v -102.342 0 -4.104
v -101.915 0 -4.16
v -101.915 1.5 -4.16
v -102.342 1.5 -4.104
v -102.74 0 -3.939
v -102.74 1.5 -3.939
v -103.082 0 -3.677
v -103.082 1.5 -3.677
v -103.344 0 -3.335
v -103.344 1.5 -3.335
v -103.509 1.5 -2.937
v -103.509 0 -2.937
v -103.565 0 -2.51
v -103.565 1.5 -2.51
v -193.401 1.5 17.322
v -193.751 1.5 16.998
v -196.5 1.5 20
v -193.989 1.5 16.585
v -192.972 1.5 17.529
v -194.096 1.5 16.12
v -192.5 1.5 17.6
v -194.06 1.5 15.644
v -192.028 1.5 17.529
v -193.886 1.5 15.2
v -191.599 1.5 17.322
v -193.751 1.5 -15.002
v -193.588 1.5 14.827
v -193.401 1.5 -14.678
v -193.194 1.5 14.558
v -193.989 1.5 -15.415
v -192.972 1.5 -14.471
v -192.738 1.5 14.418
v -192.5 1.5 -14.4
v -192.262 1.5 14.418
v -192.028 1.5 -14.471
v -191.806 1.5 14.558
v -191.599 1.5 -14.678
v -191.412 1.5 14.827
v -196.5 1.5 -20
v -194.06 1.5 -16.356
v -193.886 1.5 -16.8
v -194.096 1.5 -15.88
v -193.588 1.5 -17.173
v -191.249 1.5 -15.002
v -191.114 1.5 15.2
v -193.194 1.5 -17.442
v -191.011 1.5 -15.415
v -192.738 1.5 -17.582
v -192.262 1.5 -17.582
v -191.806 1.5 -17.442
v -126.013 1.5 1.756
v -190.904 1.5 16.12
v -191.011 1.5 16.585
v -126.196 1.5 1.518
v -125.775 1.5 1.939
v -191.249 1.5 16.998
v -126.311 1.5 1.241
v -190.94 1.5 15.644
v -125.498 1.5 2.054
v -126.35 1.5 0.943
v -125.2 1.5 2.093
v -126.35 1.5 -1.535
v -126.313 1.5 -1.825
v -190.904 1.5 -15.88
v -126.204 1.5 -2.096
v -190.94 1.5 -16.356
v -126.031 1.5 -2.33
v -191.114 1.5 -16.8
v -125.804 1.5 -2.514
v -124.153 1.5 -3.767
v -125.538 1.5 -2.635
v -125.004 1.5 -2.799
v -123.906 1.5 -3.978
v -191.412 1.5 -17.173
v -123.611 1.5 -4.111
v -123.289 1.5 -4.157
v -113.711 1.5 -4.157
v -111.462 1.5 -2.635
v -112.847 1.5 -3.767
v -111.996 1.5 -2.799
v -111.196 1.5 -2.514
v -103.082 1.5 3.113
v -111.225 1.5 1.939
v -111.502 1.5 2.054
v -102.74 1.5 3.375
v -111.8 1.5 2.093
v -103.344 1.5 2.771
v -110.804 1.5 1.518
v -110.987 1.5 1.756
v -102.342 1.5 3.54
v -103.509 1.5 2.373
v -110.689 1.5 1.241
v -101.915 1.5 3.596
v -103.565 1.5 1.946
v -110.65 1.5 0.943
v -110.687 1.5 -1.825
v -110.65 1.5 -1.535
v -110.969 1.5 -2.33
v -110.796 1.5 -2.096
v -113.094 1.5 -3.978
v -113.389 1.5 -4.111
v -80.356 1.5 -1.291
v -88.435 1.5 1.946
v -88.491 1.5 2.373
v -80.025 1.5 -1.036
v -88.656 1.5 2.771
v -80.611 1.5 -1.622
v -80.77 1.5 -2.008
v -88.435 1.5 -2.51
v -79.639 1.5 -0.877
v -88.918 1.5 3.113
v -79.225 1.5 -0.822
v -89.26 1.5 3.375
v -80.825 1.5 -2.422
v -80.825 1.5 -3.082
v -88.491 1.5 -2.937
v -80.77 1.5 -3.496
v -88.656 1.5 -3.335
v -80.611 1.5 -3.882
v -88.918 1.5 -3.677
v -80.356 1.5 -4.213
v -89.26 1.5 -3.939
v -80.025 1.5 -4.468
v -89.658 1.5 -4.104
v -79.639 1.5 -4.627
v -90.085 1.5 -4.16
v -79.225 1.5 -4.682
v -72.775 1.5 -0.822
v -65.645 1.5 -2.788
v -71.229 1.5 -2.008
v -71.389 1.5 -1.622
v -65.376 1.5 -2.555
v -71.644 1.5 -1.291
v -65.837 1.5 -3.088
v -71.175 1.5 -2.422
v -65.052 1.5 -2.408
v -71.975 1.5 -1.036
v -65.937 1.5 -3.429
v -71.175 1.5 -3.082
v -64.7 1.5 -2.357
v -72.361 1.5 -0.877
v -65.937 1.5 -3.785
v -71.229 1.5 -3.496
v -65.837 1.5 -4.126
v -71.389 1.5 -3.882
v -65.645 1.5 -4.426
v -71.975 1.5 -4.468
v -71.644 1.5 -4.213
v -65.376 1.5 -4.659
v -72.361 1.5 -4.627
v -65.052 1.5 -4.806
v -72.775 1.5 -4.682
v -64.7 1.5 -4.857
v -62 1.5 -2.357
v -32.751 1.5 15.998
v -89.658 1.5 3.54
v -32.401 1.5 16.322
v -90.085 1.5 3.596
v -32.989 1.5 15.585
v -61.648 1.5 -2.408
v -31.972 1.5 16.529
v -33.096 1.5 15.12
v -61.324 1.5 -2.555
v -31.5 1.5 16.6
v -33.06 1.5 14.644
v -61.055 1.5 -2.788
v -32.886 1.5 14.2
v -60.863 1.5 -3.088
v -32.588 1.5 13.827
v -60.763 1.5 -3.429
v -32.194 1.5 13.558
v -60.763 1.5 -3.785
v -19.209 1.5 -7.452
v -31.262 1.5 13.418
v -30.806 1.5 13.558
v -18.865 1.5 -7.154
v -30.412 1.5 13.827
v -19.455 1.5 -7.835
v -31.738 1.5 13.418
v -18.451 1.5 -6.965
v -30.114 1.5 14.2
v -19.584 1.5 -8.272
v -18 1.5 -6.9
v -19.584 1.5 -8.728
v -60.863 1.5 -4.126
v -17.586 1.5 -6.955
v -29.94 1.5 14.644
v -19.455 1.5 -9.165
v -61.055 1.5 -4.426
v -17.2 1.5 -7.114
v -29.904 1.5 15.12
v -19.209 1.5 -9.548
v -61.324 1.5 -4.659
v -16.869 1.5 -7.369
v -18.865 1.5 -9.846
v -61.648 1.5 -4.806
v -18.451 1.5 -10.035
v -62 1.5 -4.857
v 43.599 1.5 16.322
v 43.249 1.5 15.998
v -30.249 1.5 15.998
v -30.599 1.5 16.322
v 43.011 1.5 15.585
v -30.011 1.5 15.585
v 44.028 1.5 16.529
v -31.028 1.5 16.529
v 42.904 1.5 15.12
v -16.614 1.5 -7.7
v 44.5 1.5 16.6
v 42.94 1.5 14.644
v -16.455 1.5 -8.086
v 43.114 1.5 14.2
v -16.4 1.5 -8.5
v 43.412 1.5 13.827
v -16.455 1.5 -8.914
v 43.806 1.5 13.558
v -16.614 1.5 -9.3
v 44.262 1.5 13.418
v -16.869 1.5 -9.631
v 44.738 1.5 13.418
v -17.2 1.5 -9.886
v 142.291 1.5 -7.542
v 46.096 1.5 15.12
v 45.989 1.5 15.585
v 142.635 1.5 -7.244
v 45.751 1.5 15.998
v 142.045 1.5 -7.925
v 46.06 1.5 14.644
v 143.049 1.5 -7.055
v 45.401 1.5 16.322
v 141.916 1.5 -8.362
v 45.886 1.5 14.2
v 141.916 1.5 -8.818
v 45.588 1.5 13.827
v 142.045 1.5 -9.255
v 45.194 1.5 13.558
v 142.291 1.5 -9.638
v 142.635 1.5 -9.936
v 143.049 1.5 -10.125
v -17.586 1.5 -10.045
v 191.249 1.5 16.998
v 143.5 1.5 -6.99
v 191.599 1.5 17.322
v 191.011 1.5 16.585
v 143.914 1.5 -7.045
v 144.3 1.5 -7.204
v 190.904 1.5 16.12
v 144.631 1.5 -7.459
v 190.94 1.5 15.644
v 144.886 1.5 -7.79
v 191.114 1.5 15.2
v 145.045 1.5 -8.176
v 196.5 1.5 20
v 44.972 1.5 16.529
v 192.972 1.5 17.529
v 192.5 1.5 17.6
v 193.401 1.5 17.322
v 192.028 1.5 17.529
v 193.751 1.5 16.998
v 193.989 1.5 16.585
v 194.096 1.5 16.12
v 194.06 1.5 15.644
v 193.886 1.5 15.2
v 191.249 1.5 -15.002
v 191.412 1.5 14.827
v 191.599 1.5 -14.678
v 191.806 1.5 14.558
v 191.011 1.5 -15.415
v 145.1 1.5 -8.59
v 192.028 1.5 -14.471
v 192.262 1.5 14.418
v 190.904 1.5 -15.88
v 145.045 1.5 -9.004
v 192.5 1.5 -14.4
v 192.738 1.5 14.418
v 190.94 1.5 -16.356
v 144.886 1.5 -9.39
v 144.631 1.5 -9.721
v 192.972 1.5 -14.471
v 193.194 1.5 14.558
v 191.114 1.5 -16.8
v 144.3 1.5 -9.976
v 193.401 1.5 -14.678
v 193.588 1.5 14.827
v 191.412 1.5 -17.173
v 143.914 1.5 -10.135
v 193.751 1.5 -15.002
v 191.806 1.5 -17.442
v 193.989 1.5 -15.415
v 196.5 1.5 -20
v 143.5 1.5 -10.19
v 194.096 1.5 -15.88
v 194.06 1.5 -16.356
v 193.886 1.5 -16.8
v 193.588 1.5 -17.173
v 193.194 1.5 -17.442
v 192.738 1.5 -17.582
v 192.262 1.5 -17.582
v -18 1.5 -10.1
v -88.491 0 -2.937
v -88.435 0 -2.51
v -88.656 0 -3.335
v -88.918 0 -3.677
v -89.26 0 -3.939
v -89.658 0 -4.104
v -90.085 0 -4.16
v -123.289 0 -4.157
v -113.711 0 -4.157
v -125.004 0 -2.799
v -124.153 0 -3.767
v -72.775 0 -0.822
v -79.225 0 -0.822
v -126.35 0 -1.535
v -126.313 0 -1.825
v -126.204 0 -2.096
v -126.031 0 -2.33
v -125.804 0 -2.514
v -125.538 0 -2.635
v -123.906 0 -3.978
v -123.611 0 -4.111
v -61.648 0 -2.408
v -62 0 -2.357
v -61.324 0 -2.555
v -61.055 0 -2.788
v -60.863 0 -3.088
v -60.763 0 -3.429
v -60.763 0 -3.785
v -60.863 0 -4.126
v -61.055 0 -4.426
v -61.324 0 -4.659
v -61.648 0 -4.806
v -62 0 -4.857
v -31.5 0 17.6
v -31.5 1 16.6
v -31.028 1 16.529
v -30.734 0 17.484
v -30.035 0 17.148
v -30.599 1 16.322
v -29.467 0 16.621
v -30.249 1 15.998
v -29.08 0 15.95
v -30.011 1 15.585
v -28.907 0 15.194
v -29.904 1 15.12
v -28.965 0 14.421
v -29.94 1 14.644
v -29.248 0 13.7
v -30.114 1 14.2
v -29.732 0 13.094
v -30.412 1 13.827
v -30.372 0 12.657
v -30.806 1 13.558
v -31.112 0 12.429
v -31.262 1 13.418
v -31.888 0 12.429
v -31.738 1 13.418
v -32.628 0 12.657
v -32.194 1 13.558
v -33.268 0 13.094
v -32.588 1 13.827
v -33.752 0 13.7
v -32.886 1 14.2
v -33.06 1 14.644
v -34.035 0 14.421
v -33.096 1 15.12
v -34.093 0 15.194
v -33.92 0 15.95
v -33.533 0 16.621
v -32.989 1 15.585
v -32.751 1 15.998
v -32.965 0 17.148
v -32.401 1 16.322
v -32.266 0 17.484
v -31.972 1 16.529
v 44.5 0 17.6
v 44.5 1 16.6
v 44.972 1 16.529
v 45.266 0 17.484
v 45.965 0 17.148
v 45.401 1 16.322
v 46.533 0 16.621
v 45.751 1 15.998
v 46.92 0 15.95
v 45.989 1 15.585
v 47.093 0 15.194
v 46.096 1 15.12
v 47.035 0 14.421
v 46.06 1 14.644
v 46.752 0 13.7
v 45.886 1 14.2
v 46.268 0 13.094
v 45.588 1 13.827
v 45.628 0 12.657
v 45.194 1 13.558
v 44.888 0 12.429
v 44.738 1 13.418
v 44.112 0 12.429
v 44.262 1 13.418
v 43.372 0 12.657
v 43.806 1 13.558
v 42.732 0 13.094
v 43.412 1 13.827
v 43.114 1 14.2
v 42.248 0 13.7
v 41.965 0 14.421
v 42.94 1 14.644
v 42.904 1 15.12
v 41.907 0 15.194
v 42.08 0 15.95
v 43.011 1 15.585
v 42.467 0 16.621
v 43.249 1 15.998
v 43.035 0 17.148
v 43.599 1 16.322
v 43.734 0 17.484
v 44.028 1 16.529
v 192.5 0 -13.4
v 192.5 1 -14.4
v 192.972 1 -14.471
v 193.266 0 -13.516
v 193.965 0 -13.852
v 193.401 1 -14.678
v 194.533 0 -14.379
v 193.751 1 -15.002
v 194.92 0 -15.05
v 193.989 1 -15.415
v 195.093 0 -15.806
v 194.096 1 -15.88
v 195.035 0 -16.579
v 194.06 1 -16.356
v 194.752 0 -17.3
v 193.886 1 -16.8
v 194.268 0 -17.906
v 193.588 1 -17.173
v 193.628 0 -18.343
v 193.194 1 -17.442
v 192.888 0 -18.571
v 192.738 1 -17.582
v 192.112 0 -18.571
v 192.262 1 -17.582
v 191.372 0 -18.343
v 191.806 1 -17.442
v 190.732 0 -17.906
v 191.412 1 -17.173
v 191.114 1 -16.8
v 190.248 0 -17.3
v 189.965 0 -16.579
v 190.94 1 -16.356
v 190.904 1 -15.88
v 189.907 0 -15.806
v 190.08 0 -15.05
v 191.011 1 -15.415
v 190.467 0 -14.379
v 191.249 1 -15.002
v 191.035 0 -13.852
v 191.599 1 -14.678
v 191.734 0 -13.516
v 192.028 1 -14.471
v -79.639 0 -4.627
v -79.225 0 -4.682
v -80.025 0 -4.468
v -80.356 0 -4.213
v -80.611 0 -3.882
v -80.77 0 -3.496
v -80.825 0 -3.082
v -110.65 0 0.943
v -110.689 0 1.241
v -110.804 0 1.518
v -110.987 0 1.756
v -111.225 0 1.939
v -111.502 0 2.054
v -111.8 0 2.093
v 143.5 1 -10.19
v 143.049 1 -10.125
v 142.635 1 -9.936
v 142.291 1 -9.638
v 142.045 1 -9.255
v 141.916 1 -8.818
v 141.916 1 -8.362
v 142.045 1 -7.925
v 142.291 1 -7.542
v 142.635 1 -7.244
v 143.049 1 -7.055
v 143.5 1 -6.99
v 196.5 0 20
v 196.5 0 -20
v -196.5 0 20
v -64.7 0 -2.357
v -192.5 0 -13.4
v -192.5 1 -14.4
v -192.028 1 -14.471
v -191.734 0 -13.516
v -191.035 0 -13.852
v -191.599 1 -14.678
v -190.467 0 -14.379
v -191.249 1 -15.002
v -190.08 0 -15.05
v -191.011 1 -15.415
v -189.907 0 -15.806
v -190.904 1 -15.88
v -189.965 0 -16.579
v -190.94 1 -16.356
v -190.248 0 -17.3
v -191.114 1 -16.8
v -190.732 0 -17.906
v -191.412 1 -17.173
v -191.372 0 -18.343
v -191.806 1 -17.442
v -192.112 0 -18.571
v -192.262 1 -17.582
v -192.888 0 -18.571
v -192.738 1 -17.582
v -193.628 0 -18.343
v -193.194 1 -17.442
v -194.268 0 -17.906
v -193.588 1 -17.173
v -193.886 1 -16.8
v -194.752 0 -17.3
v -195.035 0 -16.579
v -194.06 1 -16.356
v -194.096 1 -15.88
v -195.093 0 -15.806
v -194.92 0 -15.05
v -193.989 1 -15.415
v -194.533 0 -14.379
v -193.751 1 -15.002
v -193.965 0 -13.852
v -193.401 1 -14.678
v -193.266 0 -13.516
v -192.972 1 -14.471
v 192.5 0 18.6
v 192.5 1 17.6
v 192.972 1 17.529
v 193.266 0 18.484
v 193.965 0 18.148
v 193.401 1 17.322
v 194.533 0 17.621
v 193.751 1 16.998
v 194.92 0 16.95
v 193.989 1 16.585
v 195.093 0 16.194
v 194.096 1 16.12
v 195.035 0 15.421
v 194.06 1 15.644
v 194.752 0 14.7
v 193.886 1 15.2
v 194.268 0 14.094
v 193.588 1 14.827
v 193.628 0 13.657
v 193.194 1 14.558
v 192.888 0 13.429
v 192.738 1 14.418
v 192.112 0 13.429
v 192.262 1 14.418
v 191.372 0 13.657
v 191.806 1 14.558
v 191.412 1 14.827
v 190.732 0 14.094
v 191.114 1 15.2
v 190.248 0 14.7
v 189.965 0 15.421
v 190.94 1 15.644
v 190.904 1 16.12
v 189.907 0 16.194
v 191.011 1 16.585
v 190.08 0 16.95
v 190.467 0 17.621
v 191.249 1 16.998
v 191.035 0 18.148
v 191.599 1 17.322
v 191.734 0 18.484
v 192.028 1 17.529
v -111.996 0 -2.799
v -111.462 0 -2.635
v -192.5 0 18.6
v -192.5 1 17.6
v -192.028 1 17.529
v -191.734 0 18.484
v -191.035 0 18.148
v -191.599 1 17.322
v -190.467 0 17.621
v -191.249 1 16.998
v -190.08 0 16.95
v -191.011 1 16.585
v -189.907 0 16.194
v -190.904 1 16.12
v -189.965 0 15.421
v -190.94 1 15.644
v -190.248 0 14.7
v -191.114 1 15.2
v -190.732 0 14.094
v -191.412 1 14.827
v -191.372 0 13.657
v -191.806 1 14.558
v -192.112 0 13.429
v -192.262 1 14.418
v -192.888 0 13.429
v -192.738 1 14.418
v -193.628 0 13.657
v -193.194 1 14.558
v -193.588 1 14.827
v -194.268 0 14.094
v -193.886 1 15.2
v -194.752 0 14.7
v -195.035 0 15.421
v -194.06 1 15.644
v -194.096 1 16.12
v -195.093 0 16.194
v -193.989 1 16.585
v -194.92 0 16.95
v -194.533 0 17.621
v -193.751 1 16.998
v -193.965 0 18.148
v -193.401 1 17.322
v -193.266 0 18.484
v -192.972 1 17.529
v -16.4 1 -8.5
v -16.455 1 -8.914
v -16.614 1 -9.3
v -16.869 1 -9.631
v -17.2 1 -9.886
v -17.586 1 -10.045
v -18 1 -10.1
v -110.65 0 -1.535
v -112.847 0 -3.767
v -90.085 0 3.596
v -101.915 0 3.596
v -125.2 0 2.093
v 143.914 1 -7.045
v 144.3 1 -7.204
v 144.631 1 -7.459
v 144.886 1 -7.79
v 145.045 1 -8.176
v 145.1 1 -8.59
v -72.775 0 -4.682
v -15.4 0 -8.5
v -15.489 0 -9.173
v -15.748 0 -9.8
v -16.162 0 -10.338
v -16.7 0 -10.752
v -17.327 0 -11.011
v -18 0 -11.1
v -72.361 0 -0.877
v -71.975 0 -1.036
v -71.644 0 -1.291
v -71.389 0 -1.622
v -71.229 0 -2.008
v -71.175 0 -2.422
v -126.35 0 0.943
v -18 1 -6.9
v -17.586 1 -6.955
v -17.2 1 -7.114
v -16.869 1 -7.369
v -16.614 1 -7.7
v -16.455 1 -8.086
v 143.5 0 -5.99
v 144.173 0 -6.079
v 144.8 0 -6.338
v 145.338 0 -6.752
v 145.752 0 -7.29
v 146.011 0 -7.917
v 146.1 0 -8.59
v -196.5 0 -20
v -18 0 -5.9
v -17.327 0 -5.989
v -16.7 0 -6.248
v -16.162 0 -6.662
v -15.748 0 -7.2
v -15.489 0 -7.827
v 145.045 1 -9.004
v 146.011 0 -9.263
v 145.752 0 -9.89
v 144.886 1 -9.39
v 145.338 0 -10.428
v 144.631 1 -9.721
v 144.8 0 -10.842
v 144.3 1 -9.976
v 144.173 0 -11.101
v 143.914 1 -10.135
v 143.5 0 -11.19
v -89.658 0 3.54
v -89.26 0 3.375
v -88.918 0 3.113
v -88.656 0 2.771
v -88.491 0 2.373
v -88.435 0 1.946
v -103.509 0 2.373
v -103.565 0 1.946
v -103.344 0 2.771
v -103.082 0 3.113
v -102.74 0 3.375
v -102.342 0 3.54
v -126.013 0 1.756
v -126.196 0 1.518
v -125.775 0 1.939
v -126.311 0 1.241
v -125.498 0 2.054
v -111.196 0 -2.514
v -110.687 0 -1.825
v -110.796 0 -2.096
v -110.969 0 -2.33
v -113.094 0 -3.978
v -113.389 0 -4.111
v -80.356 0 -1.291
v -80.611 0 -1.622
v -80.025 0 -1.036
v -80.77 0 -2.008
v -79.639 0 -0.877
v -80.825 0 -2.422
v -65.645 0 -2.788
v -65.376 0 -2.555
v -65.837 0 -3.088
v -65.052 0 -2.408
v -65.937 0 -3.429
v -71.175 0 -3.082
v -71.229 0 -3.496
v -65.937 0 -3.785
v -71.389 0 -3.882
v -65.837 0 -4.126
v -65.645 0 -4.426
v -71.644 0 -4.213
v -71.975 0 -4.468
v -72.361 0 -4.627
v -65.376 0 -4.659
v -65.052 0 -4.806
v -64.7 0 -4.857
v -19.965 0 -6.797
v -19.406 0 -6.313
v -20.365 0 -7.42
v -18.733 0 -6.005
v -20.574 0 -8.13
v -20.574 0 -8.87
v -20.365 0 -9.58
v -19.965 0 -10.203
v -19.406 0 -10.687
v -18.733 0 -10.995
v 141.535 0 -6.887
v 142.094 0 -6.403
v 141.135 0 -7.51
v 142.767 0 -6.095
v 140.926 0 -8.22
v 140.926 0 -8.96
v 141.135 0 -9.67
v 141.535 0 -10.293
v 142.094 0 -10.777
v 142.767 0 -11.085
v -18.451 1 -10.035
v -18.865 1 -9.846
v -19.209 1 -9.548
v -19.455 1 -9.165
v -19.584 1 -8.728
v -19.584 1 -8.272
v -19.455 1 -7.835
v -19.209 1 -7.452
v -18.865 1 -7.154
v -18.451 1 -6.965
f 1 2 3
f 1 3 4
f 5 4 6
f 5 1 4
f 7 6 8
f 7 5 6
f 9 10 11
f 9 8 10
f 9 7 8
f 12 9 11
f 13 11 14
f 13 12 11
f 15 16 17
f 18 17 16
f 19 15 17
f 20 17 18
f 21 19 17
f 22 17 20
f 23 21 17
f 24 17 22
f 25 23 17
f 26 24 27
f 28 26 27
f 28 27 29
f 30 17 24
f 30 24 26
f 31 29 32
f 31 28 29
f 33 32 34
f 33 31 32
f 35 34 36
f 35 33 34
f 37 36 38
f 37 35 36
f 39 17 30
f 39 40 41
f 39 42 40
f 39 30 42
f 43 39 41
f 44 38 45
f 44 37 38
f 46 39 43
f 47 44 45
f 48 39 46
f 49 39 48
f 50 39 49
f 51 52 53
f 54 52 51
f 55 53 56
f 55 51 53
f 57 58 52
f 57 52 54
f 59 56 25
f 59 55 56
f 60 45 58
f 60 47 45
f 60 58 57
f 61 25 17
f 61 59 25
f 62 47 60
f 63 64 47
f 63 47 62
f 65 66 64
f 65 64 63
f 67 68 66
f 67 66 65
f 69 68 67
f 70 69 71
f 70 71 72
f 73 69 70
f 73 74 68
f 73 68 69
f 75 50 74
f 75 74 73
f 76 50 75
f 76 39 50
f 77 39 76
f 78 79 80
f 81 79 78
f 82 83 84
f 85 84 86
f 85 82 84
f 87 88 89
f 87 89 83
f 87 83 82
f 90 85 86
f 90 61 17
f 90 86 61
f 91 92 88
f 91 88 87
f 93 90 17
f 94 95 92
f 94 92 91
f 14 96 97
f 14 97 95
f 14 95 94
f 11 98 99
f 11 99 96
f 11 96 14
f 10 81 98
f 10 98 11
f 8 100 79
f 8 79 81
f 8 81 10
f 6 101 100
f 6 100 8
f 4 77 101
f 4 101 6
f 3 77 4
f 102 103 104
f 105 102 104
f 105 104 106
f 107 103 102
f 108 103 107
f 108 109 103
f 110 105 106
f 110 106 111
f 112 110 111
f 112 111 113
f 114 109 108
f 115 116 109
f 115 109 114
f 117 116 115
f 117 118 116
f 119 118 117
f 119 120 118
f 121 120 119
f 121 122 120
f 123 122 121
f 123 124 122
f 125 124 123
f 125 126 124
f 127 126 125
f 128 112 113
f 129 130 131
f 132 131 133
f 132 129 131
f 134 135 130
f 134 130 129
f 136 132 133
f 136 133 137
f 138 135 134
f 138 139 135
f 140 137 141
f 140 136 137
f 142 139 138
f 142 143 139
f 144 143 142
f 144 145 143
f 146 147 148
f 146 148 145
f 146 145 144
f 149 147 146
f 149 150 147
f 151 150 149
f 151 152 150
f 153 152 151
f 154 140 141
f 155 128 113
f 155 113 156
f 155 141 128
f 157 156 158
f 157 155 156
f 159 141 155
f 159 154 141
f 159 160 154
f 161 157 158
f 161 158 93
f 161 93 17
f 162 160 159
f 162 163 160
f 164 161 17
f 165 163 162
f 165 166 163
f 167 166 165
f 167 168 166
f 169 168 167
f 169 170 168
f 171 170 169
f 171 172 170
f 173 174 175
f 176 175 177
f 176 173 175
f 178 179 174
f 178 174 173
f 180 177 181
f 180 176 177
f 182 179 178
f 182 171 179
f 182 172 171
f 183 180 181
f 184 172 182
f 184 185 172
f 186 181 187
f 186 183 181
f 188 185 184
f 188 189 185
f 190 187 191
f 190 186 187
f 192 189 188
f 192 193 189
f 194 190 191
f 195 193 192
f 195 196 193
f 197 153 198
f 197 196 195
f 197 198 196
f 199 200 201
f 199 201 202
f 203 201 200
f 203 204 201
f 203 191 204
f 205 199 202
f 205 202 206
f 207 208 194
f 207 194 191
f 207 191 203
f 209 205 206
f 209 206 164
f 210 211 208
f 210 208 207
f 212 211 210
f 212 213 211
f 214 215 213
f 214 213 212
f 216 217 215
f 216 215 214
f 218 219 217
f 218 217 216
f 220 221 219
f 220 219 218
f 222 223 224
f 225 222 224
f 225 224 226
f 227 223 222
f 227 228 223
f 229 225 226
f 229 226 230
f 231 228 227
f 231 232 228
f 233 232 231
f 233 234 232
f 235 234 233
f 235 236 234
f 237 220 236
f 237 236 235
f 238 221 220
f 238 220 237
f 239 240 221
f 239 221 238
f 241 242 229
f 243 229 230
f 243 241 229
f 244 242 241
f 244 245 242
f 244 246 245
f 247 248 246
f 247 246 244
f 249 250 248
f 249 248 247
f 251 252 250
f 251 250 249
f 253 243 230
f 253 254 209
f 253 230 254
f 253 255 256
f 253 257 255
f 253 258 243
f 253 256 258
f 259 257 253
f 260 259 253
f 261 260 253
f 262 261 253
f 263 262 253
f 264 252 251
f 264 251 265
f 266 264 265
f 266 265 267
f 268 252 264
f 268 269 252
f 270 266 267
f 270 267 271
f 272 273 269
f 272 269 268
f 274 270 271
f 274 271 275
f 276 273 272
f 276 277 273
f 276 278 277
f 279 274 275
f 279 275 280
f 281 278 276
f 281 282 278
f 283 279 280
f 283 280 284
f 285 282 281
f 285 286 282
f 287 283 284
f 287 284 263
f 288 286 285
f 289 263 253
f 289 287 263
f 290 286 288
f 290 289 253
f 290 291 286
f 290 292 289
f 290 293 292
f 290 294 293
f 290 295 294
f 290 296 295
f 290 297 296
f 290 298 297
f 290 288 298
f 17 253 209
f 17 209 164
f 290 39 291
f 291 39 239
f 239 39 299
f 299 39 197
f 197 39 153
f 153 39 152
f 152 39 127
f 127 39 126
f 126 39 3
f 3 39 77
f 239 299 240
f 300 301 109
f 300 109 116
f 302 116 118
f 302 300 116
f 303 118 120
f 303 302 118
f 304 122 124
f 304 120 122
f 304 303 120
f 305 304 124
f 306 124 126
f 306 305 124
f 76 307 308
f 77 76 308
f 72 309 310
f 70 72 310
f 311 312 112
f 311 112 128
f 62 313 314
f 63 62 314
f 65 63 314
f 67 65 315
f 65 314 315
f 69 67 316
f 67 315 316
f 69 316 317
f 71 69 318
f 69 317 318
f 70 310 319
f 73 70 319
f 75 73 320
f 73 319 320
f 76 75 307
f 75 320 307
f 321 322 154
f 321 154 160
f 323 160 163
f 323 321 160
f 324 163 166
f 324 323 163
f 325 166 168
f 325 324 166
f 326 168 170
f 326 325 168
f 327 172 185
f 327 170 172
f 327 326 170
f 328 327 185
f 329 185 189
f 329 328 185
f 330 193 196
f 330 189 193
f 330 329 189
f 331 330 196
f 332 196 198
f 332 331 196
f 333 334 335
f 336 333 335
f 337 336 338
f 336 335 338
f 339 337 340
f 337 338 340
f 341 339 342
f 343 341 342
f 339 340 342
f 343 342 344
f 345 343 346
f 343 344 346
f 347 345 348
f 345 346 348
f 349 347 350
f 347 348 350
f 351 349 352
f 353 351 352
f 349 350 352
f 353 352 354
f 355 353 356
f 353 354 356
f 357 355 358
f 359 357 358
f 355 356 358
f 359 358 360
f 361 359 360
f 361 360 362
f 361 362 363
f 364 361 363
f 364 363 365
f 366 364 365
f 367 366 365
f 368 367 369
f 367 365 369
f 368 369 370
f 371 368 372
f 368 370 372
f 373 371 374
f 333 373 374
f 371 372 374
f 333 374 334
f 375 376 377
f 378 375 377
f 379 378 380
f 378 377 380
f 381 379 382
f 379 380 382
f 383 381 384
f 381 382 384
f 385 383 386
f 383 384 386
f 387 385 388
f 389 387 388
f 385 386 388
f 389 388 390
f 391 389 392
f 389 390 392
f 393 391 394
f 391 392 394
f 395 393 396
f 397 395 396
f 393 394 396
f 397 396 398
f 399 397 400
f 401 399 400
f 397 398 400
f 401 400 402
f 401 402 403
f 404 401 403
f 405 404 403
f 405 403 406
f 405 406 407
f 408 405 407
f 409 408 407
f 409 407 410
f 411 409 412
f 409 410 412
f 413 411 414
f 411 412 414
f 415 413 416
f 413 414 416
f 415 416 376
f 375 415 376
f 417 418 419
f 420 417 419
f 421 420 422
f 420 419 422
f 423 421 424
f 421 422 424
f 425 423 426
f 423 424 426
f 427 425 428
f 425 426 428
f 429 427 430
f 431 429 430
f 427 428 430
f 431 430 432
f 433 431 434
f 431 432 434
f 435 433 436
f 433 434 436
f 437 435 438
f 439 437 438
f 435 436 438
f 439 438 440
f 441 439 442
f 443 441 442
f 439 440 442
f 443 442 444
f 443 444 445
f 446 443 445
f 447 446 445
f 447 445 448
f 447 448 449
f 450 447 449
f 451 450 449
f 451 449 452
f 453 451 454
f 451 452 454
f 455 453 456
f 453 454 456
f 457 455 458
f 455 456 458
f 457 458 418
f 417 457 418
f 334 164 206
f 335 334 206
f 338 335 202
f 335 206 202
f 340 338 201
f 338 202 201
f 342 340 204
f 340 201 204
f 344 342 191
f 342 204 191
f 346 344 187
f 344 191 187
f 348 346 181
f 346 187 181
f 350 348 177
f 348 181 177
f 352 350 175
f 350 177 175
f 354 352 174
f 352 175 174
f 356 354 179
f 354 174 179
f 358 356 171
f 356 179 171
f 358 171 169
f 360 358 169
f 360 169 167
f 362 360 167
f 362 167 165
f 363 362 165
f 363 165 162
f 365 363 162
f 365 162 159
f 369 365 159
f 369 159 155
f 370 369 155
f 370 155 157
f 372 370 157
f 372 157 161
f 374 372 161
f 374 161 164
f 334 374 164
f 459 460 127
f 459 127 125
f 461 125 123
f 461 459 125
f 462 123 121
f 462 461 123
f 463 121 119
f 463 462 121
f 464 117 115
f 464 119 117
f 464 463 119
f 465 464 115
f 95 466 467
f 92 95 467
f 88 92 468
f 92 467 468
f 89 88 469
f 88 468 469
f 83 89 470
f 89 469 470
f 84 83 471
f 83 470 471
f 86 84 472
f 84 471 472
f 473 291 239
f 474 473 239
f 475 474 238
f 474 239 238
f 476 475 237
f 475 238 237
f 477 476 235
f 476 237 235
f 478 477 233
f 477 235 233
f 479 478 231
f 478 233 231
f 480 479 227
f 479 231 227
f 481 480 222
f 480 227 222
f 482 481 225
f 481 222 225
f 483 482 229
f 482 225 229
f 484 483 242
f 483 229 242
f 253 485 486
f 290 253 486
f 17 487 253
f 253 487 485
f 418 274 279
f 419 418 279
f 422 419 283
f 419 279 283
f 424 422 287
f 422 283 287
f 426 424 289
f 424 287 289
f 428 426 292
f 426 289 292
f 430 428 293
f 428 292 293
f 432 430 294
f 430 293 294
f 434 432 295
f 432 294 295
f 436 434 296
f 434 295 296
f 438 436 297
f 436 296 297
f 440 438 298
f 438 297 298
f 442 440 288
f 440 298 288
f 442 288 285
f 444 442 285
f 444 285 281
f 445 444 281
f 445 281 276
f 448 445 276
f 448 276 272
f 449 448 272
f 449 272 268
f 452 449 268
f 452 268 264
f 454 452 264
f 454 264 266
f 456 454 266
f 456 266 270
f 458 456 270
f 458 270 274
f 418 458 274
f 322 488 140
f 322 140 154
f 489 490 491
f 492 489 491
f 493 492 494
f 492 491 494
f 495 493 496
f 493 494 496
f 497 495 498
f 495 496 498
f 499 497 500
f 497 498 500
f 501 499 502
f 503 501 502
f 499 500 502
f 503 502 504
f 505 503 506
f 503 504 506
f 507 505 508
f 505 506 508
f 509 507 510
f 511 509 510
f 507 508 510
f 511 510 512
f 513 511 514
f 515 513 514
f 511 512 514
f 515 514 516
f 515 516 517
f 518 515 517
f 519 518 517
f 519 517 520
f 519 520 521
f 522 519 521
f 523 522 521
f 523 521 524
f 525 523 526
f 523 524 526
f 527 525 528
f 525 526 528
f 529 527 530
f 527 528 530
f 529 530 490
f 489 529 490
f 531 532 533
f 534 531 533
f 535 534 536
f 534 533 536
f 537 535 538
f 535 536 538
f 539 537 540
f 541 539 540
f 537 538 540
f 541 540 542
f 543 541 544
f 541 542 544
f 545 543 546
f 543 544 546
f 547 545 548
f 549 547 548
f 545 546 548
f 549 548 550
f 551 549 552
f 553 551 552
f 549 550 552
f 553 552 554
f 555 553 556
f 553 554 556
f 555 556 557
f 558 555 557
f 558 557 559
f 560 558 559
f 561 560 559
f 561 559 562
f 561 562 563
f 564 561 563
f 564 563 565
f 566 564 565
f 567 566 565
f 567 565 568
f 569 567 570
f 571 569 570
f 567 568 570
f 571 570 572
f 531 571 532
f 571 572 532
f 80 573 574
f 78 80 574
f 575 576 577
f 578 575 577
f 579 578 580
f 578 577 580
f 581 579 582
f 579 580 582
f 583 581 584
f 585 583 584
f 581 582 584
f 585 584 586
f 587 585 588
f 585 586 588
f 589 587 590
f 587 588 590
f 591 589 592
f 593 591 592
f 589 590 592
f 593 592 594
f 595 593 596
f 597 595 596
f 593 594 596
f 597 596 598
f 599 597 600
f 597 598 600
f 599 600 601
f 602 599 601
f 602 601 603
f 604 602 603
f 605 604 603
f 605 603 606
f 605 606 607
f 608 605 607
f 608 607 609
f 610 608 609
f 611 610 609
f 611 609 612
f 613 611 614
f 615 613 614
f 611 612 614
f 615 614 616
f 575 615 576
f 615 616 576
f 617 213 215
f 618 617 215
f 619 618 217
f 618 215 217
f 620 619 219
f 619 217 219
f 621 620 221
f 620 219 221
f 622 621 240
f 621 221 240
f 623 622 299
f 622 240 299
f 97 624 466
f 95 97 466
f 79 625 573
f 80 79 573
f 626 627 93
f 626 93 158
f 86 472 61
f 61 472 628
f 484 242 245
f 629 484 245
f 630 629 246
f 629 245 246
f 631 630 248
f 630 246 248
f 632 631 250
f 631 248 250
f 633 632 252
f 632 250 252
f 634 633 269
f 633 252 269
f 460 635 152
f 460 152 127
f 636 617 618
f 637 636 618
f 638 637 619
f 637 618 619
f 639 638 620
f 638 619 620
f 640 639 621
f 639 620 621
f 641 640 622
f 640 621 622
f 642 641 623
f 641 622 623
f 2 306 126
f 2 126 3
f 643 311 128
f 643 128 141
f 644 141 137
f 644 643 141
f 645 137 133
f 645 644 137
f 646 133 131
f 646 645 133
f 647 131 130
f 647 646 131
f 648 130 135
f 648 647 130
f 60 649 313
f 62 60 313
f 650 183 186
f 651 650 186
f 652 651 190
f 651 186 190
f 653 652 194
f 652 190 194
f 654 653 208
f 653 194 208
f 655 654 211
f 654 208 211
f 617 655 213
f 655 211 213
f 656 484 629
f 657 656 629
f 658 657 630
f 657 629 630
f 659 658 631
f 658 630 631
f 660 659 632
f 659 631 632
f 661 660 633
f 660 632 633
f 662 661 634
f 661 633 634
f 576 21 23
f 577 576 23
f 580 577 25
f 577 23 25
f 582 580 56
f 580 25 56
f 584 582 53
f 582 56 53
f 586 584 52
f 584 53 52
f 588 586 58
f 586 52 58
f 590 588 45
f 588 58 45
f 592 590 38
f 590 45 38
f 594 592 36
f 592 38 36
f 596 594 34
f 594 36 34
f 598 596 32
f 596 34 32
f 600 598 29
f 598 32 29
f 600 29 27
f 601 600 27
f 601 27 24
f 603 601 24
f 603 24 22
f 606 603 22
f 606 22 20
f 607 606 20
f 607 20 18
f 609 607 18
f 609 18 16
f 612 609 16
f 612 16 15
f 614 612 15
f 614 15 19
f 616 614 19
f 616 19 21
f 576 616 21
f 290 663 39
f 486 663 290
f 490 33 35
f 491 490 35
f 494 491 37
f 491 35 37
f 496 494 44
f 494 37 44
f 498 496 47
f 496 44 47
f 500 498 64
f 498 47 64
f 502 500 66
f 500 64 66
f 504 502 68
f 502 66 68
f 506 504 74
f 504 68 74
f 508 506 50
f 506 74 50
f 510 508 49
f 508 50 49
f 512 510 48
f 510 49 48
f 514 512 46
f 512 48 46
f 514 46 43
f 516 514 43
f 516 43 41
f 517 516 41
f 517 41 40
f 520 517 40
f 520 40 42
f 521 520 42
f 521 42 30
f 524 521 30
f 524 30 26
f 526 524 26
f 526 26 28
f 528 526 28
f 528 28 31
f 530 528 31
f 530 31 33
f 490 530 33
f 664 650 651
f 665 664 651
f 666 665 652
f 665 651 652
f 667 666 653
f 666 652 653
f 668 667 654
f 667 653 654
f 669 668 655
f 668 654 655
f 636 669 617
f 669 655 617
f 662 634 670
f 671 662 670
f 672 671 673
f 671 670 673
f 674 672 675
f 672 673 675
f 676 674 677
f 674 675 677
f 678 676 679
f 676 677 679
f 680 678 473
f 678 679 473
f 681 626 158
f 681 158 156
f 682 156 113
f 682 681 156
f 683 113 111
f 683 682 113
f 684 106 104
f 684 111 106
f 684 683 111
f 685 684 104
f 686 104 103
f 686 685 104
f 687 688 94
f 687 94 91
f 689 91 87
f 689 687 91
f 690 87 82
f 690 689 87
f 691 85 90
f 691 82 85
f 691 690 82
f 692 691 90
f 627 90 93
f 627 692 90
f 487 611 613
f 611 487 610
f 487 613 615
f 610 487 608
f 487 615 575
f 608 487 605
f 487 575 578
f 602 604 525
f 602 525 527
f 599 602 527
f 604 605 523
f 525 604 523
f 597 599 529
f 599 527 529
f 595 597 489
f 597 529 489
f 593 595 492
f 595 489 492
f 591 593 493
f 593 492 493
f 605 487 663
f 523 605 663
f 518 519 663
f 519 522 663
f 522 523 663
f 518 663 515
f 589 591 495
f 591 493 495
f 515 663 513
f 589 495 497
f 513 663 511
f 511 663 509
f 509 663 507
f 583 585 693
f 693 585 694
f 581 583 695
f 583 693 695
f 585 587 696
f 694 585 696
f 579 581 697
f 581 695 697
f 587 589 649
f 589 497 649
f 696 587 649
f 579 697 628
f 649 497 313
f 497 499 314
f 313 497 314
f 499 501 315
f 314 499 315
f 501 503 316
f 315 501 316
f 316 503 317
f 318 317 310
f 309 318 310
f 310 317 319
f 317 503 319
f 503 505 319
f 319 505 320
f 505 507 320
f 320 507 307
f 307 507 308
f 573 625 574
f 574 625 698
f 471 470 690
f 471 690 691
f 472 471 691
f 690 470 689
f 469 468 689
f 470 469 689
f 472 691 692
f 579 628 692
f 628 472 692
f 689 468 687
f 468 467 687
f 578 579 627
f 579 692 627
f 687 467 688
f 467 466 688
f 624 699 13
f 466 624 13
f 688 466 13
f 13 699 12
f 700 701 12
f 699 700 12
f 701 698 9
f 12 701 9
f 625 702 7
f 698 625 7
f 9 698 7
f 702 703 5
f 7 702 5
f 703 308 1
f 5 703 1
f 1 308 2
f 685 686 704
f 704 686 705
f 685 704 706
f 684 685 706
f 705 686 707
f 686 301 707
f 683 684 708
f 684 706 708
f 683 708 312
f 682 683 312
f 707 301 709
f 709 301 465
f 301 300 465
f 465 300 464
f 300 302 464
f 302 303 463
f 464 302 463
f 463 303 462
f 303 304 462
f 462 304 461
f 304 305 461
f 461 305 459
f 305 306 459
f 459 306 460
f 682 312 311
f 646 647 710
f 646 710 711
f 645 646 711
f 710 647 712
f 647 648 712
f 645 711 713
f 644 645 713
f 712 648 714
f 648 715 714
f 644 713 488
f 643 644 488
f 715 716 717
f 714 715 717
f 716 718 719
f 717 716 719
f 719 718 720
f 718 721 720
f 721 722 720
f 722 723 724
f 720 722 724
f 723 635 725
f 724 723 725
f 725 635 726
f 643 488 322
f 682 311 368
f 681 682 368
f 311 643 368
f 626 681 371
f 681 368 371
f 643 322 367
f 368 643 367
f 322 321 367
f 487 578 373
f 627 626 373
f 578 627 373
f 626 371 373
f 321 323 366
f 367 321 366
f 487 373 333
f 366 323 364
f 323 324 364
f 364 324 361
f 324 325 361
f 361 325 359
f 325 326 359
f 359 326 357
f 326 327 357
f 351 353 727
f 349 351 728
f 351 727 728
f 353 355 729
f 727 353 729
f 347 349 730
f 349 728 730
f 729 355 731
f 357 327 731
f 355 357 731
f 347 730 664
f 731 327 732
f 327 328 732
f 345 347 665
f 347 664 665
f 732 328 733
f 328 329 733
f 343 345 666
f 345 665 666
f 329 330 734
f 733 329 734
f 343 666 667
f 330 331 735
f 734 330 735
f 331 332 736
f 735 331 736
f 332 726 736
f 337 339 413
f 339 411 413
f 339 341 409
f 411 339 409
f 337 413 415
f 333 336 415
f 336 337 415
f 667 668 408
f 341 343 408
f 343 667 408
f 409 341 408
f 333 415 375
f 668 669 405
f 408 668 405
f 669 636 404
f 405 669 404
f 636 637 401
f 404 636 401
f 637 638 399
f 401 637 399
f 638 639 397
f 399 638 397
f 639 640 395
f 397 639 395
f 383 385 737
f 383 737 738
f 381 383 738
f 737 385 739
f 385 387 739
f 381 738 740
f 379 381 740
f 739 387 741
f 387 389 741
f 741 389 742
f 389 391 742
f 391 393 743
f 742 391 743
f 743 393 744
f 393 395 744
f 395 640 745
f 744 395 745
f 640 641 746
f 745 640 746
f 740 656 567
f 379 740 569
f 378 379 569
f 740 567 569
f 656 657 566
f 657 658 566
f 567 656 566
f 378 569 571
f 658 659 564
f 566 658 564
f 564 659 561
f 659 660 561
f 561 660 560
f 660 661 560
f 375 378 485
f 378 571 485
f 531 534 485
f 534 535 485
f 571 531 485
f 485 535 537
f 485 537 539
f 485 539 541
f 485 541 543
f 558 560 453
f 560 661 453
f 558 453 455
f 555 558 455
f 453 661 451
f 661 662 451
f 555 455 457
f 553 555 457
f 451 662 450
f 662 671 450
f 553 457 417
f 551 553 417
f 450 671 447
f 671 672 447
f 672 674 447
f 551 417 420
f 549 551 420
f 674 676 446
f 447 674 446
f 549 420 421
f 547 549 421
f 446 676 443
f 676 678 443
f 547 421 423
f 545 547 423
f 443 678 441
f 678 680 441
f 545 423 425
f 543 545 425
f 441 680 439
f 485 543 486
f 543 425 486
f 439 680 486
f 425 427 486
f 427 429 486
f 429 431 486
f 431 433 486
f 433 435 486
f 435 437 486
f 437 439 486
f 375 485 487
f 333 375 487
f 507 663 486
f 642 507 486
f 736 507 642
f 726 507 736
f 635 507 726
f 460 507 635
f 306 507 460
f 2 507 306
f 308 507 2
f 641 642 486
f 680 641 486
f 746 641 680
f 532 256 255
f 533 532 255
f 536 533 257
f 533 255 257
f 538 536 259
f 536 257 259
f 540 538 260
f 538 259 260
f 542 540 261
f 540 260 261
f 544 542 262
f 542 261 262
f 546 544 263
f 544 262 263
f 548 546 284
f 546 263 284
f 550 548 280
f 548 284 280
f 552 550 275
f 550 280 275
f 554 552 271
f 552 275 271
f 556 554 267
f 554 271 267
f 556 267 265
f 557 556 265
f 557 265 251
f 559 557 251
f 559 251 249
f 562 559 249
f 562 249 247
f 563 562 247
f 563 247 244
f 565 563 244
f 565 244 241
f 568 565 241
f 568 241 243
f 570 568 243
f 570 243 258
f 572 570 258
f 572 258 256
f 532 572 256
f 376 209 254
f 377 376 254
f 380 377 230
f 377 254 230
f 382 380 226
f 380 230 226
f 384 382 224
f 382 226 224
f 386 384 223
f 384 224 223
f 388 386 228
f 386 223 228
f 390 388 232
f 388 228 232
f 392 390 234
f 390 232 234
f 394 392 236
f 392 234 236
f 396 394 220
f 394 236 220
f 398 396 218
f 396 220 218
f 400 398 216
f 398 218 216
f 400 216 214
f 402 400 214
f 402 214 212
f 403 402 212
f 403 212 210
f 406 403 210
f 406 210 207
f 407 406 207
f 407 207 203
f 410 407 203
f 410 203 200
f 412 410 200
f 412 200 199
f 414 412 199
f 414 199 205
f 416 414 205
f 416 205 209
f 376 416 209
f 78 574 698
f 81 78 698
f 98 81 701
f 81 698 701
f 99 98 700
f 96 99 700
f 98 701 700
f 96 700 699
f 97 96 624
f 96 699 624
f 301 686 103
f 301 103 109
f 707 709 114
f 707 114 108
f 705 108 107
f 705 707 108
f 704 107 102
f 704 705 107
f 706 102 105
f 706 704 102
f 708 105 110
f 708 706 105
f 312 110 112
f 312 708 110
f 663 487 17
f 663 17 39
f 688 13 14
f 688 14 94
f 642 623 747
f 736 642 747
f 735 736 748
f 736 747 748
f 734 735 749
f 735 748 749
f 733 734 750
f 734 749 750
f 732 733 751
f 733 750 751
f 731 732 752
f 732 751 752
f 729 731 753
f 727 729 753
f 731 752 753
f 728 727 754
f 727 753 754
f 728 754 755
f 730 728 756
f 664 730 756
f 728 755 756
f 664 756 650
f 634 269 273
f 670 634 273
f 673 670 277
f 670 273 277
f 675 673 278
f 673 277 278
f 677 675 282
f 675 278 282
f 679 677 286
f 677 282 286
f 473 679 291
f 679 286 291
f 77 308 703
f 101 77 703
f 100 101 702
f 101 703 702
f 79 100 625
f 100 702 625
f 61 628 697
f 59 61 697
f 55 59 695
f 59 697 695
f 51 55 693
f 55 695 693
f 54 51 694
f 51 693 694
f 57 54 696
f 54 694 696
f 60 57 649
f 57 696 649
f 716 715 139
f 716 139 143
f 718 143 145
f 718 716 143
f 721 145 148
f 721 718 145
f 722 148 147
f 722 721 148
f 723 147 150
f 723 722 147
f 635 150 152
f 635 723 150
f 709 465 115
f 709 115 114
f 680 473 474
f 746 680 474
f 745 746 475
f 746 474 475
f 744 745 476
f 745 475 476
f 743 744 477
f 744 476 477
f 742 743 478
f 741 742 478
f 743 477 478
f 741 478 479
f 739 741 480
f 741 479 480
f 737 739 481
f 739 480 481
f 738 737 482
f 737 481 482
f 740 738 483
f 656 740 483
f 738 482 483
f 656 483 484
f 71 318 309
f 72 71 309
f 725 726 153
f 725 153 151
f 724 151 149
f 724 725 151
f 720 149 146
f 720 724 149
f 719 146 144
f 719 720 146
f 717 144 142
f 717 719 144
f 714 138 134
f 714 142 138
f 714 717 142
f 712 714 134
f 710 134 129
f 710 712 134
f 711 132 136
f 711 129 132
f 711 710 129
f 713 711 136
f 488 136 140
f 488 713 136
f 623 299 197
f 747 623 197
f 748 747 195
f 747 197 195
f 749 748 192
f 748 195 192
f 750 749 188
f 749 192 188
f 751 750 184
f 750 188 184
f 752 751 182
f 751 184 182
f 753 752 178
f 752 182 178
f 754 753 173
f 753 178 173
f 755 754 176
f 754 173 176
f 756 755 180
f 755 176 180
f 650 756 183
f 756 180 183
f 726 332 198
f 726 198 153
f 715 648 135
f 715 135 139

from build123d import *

# Parameters (mm, degrees)
SKIZZE1_W                       = 393
SKIZZE1_H                       = 40
AUFSATZ_LINEAR_AUSTRAGEN1_DEPTH = 1.5
SKIZZE2_R                       = 1.6
SCHNITT_LINEAR_AUSTRAGEN1_DEPTH = 198.520884972
FASE1_SIZE                      = 1
SCHNITT_LINEAR_AUSTRAGEN2_DEPTH = 198.520884972


with BuildPart() as part:
    # Skizze1 → Aufsatz-Linear austragen1 (new body)
    with BuildSketch(Plane(origin=(0, 0, 0), x_dir=(1, 0, 0), z_dir=(0, 1, 0))):
        Rectangle(SKIZZE1_W, SKIZZE1_H)
    extrude(amount=AUFSATZ_LINEAR_AUSTRAGEN1_DEPTH)

    # Skizze2 → Schnitt-Linear austragen1 (cut, through all)
    with BuildSketch(Plane(origin=(0, 1.5, 0), x_dir=(1, 0, 0), z_dir=(0, 1, 0))):
        with Locations(Location((-192.5, 16, 0), (0, 0, 270))):
            Circle(SKIZZE2_R)
        with Locations(Location((-192.5, -16, 0), (0, 0, 270))):
            Circle(SKIZZE2_R)
        with Locations(Location((192.5, -16, 0), (0, 0, 270))):
            Circle(SKIZZE2_R)
        with Locations(Location((192.5, 16, 0), (0, 0, 270))):
            Circle(SKIZZE2_R)
        with Locations(Location((44.5, -15, 0), (0, 0, 270))):
            Circle(SKIZZE2_R)
        with BuildLine():
            ThreePointArc((-16.400011, 8.5), (-16.86864015, 9.63137085), (-18.000011, 10.1))
            Line((-18.000011, 10.1), (-18.000011, 6.9))
            ThreePointArc((-18.000011, 6.9), (-16.86864015, 7.36862915), (-16.400011, 8.5))
        make_face()
        with BuildLine():
            Line((-18.000011, 6.9), (-18.000011, 10.1))
            ThreePointArc((-18.000011, 10.1), (-19.600011, 8.5), (-18.000011, 6.9))
        make_face()
        with BuildLine():
            ThreePointArc((145.099964038, 8.589999773), (144.631340773, 9.721364737), (143.499980683, 10.189999773))
            Line((143.499980683, 10.189999773), (143.499947392, 6.989999773))
            ThreePointArc((143.499947392, 6.989999773), (144.631329002, 7.458623038), (145.099964038, 8.589999773))
        make_face()
        with BuildLine():
            Line((143.499947392, 6.989999773), (143.499980683, 10.189999773))
            ThreePointArc((143.499980683, 10.189999773), (141.899964038, 8.590016418), (143.499947392, 6.989999773))
        make_face()
        with Locations(Location((-31.5, -15, 0), (0, 0, 270))):
            Circle(SKIZZE2_R)
    extrude(amount=-SCHNITT_LINEAR_AUSTRAGEN1_DEPTH, mode=Mode.SUBTRACT)

    # Fase1
    fase1_edges = [part.edges().sort_by_distance(p)[0] for p in [
        (44.5, 0, 13.4),
        (192.5, 0, -17.6),
        (192.5, 0, 14.4),
        (-192.5, 0, 14.4),
        (-18.000011, 0, -10.1),
        (143.499947392, 0, -6.989999773),
        (-31.5, 0, 13.4),
        (-192.5, 0, -17.6),
    ]]
    chamfer(fase1_edges, length=FASE1_SIZE)

    # Skizze3 → Schnitt-Linear austragen2 (cut, through all)
    with BuildSketch(Plane.XZ):
        with BuildLine():
            Line((-64.700005979, -2.35700022), (-62.000005979, -2.35700022))
            ThreePointArc((-62.000005979, -2.35700022), (-60.750005979, -3.60700022), (-62.000005979, -4.85700022))
            Line((-62.000005979, -4.85700022), (-64.700005979, -4.85700022))
            ThreePointArc((-64.700005979, -4.85700022), (-65.950005979, -3.60700022), (-64.700005979, -2.35700022))
        make_face()
        with BuildLine():
            Line((-111.800007059, 2.092999135), (-125.200007059, 2.093000306))
            ThreePointArc((-125.200007059, 2.093000306), (-126.013179849, 1.756173213), (-126.350007159, 0.943000513))
            Line((-126.350007159, 0.943000513), (-126.350007376, -1.535427197))
            ThreePointArc((-126.350007376, -1.535427197), (-126.125055687, -2.21864441), (-125.538206197, -2.634573128))
            Line((-125.538206197, -2.634573128), (-125.004483233, -2.79879563))
            Line((-125.004483233, -2.79879563), (-124.152708289, -3.766721872))
            ThreePointArc((-124.152708289, -3.766721872), (-123.763106884, -4.054897814), (-123.289387767, -4.156999861))
            Line((-123.289387767, -4.156999861), (-113.710627438, -4.157000698))
            ThreePointArc((-113.710627438, -4.157000698), (-113.236908304, -4.054898732), (-112.847306849, -3.766722856))
            Line((-112.847306849, -3.766722856), (-111.995531741, -2.798796767))
            Line((-111.995531741, -2.798796767), (-111.461808748, -2.634574359))
            ThreePointArc((-111.461808748, -2.634574359), (-110.874959185, -2.218645743), (-110.650007376, -1.535428569))
            Line((-110.650007376, -1.535428569), (-110.650007159, 0.942999034))
            ThreePointArc((-110.650007159, 0.942999034), (-110.98683429, 1.756171862), (-111.800007059, 2.092999135))
        make_face()
        with BuildLine():
            Line((-101.915250235, 3.595995958), (-90.084765307, 3.595995958))
            ThreePointArc((-90.084765307, 3.595995958), (-88.918039118, 3.112722147), (-88.434765307, 1.945995958))
            Line((-88.434765307, 1.945995958), (-88.434765307, -2.510004042))
            ThreePointArc((-88.434765307, -2.510004042), (-88.918039118, -3.676730231), (-90.084765307, -4.160004042))
            Line((-90.084765307, -4.160004042), (-101.915250235, -4.160004042))
            ThreePointArc((-101.915250235, -4.160004042), (-103.081976424, -3.676730231), (-103.565250235, -2.510004042))
            Line((-103.565250235, -2.510004042), (-103.565250235, 1.945995958))
            ThreePointArc((-103.565250235, 1.945995958), (-103.081976424, 3.112722147), (-101.915250235, 3.595995958))
        make_face()
        with BuildLine():
            Line((-79.224953939, -0.821999997), (-72.774953939, -0.821999997))
            ThreePointArc((-72.774953939, -0.821999997), (-71.643582904, -1.290629498), (-71.174953542, -2.42200059))
            Line((-71.174953542, -2.42200059), (-71.174954106, -3.082000561))
            ThreePointArc((-71.174954106, -3.082000561), (-71.643583256, -4.213371411), (-72.774954106, -4.682000561))
            Line((-72.774954106, -4.682000561), (-79.224954215, -4.681999997))
            ThreePointArc((-79.224954215, -4.681999997), (-80.356325086, -4.21337078), (-80.824954106, -3.081999827))
            Line((-80.824954106, -3.081999827), (-80.824954106, -2.422000164))
            ThreePointArc((-80.824954106, -2.422000164), (-80.356324907, -1.290629196), (-79.224953939, -0.821999997))
        make_face()
    extrude(amount=-SCHNITT_LINEAR_AUSTRAGEN2_DEPTH, mode=Mode.SUBTRACT)


solid = part.part
